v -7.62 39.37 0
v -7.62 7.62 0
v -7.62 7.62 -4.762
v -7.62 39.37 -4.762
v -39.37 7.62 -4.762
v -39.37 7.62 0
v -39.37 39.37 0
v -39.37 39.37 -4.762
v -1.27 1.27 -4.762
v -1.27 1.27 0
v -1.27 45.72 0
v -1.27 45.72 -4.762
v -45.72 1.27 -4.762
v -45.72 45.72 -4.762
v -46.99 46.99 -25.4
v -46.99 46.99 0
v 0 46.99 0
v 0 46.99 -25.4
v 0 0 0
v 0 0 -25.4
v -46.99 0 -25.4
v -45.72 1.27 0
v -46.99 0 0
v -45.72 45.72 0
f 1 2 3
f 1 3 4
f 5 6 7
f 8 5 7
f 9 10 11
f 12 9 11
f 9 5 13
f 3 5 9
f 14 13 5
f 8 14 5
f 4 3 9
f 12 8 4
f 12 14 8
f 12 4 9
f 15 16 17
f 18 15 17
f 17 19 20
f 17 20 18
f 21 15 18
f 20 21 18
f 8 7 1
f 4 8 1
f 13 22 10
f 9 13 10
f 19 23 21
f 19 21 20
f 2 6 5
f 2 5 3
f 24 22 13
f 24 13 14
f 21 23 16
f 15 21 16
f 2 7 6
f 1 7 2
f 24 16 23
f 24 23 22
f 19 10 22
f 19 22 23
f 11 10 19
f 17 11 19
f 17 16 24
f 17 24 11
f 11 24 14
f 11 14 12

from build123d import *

# Parameters (mm, degrees)
F0_W     = 46.99
F0_H     = 46.99
F0_W_2   = 44.45
F0_H_2   = 44.45
F0_W_3   = 31.75
F0_H_3   = 31.75
F1_DEPTH = 25.4
F2_DEPTH = 4.7625


with BuildPart() as f1:
    # F0 (on Top) → F1 (new body)
    with BuildSketch(Plane.XY):
        with Locations((-23.495, 23.495)):
            Rectangle(F0_W, F0_H)
        with Locations((-23.495, 23.495)):
            Rectangle(F0_W_2, F0_H_2, mode=Mode.SUBTRACT)
        with Locations((-23.495, 23.495)):
            Rectangle(F0_W_2, F0_H_2)
        with Locations((-23.495, 23.495)):
            Rectangle(F0_W_3, F0_H_3, mode=Mode.SUBTRACT)
        with Locations((-23.495, 23.495)):
            Rectangle(F0_W_3, F0_H_3)
    extrude(amount=-F1_DEPTH)

    # F0 (on Top) → F2 (cut)
    with BuildSketch(Plane.XY):
        with Locations((-23.495, 23.495)):
            Rectangle(F0_W_2, F0_H_2)
        with Locations((-23.495, 23.495)):
            Rectangle(F0_W_3, F0_H_3, mode=Mode.SUBTRACT)
    extrude(amount=-F2_DEPTH, mode=Mode.SUBTRACT)


solid = f1.part
